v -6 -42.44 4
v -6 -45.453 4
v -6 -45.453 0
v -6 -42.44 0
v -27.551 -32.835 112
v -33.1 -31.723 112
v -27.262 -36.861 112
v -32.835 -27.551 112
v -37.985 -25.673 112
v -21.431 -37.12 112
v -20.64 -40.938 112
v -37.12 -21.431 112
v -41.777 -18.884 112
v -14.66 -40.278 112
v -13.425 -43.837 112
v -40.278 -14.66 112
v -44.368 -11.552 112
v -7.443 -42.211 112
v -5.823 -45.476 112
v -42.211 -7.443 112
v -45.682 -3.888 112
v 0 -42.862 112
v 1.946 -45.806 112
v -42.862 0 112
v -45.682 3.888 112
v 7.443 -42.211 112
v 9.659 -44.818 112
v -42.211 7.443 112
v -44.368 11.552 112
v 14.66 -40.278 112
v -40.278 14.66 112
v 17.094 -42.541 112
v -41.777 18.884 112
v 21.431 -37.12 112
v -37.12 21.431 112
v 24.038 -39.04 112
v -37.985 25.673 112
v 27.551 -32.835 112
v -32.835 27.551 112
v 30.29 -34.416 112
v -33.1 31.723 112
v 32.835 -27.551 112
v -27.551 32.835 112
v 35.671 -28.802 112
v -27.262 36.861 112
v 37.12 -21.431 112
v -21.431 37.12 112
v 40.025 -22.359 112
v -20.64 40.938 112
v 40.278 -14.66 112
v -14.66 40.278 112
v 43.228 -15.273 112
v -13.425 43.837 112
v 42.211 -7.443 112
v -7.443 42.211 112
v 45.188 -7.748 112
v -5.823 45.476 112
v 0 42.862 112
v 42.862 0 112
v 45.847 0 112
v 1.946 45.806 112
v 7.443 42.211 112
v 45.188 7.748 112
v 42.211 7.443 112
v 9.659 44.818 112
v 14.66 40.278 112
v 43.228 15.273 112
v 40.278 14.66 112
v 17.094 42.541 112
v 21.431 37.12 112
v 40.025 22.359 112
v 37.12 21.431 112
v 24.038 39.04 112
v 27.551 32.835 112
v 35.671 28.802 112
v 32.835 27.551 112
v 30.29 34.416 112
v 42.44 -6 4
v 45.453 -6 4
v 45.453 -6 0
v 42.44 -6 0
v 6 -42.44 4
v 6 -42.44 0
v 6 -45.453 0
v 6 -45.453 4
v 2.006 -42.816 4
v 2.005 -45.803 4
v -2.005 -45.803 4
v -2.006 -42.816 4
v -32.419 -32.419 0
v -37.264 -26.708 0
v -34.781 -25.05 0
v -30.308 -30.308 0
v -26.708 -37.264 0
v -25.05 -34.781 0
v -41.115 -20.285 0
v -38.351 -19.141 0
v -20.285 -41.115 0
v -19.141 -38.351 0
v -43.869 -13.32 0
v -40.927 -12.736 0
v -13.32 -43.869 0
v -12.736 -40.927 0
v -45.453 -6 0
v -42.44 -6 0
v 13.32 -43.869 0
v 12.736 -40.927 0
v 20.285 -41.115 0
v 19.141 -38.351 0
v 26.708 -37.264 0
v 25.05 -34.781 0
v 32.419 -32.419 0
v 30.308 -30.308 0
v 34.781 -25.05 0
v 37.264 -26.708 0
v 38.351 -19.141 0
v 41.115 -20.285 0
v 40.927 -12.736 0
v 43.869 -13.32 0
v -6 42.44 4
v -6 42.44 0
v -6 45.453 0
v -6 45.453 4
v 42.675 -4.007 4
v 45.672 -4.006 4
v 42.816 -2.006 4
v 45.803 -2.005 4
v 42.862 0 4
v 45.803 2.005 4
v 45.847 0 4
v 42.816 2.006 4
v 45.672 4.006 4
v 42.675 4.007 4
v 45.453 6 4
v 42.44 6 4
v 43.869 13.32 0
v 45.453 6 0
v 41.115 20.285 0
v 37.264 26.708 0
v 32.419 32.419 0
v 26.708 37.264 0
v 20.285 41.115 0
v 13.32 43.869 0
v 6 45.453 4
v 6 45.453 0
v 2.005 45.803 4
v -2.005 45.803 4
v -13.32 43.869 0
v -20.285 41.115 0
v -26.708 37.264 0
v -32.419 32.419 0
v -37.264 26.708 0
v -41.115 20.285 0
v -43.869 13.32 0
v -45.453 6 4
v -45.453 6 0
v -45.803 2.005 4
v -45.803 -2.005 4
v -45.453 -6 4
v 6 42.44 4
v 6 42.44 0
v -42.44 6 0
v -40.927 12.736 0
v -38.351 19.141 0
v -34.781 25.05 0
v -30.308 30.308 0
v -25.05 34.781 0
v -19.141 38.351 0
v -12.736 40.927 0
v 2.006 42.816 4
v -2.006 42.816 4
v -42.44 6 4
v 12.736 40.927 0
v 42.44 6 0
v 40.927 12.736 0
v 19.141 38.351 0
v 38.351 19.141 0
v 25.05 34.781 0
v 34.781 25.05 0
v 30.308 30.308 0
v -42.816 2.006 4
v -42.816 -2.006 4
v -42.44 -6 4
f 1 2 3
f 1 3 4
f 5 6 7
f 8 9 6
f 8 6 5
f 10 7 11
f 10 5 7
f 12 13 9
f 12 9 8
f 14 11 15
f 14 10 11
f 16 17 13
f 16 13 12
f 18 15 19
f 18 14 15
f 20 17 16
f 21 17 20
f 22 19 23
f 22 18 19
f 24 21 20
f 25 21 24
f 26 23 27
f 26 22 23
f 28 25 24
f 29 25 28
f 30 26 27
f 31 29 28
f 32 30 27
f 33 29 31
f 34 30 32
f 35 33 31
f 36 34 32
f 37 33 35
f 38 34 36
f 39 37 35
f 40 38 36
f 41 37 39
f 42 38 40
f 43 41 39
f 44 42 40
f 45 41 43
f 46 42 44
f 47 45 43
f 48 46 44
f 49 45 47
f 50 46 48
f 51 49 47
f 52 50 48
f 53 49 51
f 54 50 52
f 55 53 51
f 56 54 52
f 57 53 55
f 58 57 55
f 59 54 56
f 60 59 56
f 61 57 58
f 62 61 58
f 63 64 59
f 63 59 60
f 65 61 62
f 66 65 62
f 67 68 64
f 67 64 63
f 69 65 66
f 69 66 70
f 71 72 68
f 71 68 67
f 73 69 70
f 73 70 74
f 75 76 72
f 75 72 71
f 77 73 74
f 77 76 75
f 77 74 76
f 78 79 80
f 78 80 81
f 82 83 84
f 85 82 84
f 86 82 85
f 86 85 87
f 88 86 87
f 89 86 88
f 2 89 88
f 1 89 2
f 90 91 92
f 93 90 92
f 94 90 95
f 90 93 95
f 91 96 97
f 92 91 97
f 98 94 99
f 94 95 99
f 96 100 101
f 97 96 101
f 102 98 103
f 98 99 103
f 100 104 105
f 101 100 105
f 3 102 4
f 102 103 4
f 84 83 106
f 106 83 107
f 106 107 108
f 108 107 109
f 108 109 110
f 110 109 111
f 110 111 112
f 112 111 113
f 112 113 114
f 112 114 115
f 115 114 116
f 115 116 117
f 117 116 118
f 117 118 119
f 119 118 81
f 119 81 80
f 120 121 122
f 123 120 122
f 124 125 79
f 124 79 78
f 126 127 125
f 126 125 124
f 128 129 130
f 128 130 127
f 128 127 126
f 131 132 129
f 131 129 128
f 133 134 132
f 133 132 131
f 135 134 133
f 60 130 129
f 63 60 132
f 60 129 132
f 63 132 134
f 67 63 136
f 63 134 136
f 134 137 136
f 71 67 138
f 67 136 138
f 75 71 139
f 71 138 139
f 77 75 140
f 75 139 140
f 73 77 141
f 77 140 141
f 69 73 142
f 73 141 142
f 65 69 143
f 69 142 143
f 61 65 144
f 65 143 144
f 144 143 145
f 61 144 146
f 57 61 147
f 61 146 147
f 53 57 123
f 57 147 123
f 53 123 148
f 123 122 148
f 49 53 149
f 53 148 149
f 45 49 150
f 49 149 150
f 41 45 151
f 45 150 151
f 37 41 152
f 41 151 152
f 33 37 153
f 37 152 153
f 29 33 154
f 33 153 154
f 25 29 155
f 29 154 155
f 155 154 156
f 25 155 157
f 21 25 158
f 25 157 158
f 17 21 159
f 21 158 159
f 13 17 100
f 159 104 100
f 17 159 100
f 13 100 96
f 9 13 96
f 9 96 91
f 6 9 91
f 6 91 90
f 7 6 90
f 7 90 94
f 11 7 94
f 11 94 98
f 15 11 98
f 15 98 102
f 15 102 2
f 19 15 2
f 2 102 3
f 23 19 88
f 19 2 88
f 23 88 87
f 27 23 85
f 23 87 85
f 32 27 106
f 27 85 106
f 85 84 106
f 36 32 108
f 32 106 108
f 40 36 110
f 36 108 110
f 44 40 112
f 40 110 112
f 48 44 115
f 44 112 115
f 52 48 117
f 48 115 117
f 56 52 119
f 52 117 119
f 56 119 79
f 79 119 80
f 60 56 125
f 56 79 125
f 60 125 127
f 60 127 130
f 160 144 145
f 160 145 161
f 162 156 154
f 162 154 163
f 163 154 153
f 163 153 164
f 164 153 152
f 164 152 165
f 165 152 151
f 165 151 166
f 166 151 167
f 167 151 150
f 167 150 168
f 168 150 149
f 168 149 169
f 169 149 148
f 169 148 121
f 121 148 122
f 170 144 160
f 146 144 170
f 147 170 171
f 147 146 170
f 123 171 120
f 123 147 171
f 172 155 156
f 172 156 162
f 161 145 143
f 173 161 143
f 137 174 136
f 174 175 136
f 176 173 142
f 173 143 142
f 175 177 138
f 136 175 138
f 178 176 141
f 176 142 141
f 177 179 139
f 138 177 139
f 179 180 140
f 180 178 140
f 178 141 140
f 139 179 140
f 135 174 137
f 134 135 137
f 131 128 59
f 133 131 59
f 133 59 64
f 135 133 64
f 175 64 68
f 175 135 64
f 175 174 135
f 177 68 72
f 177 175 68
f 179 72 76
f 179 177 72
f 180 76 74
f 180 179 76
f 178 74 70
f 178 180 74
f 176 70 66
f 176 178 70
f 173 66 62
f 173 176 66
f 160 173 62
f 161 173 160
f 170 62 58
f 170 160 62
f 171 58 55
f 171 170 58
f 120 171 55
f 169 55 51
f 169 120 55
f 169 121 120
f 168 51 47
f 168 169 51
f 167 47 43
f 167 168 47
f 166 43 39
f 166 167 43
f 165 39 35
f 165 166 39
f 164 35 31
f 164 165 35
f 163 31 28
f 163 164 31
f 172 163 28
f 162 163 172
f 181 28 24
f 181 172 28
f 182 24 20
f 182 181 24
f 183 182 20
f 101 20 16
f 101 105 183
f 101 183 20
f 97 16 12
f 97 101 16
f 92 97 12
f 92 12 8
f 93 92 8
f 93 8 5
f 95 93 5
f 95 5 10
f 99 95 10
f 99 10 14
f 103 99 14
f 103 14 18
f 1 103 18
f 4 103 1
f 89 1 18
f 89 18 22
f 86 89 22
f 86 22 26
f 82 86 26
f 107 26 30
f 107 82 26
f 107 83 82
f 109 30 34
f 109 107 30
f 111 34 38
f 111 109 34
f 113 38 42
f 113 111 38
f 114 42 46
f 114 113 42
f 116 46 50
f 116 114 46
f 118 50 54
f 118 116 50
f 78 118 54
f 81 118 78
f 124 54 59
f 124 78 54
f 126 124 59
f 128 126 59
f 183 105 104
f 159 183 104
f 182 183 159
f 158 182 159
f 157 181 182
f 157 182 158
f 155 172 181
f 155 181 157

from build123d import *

# Parameters (mm, degrees)
SKETCH1_R           = 45.847
SKETCH1_R_2         = 42.8625
BOSS_EXTRUDE1_DEPTH = 112
CUT_EXTRUDE1_DEPTH  = 4


with BuildPart() as part:
    # Sketch1 → Boss-Extrude1 (new body)
    with BuildSketch(Plane.XY):
        Circle(SKETCH1_R)
        Circle(SKETCH1_R_2, mode=Mode.SUBTRACT)
    extrude(amount=BOSS_EXTRUDE1_DEPTH)

    # Sketch3 → Cut-Extrude1 (cut)
    with BuildSketch(Plane(origin=(0, 0, 0), x_dir=(-1, 0, 0), z_dir=(0, 0, -1))):
        Polygon((6, 45.847), (-6, 45.847), (-6, 6), (-45.847, 6), (-45.847, -6), (-6, -6), (-6, -45.847), (6, -45.847), (6, -6), (45.847, -6), (45.847, 6), (6, 6), align=None)
    extrude(amount=-CUT_EXTRUDE1_DEPTH, mode=Mode.SUBTRACT)


solid = part.part
